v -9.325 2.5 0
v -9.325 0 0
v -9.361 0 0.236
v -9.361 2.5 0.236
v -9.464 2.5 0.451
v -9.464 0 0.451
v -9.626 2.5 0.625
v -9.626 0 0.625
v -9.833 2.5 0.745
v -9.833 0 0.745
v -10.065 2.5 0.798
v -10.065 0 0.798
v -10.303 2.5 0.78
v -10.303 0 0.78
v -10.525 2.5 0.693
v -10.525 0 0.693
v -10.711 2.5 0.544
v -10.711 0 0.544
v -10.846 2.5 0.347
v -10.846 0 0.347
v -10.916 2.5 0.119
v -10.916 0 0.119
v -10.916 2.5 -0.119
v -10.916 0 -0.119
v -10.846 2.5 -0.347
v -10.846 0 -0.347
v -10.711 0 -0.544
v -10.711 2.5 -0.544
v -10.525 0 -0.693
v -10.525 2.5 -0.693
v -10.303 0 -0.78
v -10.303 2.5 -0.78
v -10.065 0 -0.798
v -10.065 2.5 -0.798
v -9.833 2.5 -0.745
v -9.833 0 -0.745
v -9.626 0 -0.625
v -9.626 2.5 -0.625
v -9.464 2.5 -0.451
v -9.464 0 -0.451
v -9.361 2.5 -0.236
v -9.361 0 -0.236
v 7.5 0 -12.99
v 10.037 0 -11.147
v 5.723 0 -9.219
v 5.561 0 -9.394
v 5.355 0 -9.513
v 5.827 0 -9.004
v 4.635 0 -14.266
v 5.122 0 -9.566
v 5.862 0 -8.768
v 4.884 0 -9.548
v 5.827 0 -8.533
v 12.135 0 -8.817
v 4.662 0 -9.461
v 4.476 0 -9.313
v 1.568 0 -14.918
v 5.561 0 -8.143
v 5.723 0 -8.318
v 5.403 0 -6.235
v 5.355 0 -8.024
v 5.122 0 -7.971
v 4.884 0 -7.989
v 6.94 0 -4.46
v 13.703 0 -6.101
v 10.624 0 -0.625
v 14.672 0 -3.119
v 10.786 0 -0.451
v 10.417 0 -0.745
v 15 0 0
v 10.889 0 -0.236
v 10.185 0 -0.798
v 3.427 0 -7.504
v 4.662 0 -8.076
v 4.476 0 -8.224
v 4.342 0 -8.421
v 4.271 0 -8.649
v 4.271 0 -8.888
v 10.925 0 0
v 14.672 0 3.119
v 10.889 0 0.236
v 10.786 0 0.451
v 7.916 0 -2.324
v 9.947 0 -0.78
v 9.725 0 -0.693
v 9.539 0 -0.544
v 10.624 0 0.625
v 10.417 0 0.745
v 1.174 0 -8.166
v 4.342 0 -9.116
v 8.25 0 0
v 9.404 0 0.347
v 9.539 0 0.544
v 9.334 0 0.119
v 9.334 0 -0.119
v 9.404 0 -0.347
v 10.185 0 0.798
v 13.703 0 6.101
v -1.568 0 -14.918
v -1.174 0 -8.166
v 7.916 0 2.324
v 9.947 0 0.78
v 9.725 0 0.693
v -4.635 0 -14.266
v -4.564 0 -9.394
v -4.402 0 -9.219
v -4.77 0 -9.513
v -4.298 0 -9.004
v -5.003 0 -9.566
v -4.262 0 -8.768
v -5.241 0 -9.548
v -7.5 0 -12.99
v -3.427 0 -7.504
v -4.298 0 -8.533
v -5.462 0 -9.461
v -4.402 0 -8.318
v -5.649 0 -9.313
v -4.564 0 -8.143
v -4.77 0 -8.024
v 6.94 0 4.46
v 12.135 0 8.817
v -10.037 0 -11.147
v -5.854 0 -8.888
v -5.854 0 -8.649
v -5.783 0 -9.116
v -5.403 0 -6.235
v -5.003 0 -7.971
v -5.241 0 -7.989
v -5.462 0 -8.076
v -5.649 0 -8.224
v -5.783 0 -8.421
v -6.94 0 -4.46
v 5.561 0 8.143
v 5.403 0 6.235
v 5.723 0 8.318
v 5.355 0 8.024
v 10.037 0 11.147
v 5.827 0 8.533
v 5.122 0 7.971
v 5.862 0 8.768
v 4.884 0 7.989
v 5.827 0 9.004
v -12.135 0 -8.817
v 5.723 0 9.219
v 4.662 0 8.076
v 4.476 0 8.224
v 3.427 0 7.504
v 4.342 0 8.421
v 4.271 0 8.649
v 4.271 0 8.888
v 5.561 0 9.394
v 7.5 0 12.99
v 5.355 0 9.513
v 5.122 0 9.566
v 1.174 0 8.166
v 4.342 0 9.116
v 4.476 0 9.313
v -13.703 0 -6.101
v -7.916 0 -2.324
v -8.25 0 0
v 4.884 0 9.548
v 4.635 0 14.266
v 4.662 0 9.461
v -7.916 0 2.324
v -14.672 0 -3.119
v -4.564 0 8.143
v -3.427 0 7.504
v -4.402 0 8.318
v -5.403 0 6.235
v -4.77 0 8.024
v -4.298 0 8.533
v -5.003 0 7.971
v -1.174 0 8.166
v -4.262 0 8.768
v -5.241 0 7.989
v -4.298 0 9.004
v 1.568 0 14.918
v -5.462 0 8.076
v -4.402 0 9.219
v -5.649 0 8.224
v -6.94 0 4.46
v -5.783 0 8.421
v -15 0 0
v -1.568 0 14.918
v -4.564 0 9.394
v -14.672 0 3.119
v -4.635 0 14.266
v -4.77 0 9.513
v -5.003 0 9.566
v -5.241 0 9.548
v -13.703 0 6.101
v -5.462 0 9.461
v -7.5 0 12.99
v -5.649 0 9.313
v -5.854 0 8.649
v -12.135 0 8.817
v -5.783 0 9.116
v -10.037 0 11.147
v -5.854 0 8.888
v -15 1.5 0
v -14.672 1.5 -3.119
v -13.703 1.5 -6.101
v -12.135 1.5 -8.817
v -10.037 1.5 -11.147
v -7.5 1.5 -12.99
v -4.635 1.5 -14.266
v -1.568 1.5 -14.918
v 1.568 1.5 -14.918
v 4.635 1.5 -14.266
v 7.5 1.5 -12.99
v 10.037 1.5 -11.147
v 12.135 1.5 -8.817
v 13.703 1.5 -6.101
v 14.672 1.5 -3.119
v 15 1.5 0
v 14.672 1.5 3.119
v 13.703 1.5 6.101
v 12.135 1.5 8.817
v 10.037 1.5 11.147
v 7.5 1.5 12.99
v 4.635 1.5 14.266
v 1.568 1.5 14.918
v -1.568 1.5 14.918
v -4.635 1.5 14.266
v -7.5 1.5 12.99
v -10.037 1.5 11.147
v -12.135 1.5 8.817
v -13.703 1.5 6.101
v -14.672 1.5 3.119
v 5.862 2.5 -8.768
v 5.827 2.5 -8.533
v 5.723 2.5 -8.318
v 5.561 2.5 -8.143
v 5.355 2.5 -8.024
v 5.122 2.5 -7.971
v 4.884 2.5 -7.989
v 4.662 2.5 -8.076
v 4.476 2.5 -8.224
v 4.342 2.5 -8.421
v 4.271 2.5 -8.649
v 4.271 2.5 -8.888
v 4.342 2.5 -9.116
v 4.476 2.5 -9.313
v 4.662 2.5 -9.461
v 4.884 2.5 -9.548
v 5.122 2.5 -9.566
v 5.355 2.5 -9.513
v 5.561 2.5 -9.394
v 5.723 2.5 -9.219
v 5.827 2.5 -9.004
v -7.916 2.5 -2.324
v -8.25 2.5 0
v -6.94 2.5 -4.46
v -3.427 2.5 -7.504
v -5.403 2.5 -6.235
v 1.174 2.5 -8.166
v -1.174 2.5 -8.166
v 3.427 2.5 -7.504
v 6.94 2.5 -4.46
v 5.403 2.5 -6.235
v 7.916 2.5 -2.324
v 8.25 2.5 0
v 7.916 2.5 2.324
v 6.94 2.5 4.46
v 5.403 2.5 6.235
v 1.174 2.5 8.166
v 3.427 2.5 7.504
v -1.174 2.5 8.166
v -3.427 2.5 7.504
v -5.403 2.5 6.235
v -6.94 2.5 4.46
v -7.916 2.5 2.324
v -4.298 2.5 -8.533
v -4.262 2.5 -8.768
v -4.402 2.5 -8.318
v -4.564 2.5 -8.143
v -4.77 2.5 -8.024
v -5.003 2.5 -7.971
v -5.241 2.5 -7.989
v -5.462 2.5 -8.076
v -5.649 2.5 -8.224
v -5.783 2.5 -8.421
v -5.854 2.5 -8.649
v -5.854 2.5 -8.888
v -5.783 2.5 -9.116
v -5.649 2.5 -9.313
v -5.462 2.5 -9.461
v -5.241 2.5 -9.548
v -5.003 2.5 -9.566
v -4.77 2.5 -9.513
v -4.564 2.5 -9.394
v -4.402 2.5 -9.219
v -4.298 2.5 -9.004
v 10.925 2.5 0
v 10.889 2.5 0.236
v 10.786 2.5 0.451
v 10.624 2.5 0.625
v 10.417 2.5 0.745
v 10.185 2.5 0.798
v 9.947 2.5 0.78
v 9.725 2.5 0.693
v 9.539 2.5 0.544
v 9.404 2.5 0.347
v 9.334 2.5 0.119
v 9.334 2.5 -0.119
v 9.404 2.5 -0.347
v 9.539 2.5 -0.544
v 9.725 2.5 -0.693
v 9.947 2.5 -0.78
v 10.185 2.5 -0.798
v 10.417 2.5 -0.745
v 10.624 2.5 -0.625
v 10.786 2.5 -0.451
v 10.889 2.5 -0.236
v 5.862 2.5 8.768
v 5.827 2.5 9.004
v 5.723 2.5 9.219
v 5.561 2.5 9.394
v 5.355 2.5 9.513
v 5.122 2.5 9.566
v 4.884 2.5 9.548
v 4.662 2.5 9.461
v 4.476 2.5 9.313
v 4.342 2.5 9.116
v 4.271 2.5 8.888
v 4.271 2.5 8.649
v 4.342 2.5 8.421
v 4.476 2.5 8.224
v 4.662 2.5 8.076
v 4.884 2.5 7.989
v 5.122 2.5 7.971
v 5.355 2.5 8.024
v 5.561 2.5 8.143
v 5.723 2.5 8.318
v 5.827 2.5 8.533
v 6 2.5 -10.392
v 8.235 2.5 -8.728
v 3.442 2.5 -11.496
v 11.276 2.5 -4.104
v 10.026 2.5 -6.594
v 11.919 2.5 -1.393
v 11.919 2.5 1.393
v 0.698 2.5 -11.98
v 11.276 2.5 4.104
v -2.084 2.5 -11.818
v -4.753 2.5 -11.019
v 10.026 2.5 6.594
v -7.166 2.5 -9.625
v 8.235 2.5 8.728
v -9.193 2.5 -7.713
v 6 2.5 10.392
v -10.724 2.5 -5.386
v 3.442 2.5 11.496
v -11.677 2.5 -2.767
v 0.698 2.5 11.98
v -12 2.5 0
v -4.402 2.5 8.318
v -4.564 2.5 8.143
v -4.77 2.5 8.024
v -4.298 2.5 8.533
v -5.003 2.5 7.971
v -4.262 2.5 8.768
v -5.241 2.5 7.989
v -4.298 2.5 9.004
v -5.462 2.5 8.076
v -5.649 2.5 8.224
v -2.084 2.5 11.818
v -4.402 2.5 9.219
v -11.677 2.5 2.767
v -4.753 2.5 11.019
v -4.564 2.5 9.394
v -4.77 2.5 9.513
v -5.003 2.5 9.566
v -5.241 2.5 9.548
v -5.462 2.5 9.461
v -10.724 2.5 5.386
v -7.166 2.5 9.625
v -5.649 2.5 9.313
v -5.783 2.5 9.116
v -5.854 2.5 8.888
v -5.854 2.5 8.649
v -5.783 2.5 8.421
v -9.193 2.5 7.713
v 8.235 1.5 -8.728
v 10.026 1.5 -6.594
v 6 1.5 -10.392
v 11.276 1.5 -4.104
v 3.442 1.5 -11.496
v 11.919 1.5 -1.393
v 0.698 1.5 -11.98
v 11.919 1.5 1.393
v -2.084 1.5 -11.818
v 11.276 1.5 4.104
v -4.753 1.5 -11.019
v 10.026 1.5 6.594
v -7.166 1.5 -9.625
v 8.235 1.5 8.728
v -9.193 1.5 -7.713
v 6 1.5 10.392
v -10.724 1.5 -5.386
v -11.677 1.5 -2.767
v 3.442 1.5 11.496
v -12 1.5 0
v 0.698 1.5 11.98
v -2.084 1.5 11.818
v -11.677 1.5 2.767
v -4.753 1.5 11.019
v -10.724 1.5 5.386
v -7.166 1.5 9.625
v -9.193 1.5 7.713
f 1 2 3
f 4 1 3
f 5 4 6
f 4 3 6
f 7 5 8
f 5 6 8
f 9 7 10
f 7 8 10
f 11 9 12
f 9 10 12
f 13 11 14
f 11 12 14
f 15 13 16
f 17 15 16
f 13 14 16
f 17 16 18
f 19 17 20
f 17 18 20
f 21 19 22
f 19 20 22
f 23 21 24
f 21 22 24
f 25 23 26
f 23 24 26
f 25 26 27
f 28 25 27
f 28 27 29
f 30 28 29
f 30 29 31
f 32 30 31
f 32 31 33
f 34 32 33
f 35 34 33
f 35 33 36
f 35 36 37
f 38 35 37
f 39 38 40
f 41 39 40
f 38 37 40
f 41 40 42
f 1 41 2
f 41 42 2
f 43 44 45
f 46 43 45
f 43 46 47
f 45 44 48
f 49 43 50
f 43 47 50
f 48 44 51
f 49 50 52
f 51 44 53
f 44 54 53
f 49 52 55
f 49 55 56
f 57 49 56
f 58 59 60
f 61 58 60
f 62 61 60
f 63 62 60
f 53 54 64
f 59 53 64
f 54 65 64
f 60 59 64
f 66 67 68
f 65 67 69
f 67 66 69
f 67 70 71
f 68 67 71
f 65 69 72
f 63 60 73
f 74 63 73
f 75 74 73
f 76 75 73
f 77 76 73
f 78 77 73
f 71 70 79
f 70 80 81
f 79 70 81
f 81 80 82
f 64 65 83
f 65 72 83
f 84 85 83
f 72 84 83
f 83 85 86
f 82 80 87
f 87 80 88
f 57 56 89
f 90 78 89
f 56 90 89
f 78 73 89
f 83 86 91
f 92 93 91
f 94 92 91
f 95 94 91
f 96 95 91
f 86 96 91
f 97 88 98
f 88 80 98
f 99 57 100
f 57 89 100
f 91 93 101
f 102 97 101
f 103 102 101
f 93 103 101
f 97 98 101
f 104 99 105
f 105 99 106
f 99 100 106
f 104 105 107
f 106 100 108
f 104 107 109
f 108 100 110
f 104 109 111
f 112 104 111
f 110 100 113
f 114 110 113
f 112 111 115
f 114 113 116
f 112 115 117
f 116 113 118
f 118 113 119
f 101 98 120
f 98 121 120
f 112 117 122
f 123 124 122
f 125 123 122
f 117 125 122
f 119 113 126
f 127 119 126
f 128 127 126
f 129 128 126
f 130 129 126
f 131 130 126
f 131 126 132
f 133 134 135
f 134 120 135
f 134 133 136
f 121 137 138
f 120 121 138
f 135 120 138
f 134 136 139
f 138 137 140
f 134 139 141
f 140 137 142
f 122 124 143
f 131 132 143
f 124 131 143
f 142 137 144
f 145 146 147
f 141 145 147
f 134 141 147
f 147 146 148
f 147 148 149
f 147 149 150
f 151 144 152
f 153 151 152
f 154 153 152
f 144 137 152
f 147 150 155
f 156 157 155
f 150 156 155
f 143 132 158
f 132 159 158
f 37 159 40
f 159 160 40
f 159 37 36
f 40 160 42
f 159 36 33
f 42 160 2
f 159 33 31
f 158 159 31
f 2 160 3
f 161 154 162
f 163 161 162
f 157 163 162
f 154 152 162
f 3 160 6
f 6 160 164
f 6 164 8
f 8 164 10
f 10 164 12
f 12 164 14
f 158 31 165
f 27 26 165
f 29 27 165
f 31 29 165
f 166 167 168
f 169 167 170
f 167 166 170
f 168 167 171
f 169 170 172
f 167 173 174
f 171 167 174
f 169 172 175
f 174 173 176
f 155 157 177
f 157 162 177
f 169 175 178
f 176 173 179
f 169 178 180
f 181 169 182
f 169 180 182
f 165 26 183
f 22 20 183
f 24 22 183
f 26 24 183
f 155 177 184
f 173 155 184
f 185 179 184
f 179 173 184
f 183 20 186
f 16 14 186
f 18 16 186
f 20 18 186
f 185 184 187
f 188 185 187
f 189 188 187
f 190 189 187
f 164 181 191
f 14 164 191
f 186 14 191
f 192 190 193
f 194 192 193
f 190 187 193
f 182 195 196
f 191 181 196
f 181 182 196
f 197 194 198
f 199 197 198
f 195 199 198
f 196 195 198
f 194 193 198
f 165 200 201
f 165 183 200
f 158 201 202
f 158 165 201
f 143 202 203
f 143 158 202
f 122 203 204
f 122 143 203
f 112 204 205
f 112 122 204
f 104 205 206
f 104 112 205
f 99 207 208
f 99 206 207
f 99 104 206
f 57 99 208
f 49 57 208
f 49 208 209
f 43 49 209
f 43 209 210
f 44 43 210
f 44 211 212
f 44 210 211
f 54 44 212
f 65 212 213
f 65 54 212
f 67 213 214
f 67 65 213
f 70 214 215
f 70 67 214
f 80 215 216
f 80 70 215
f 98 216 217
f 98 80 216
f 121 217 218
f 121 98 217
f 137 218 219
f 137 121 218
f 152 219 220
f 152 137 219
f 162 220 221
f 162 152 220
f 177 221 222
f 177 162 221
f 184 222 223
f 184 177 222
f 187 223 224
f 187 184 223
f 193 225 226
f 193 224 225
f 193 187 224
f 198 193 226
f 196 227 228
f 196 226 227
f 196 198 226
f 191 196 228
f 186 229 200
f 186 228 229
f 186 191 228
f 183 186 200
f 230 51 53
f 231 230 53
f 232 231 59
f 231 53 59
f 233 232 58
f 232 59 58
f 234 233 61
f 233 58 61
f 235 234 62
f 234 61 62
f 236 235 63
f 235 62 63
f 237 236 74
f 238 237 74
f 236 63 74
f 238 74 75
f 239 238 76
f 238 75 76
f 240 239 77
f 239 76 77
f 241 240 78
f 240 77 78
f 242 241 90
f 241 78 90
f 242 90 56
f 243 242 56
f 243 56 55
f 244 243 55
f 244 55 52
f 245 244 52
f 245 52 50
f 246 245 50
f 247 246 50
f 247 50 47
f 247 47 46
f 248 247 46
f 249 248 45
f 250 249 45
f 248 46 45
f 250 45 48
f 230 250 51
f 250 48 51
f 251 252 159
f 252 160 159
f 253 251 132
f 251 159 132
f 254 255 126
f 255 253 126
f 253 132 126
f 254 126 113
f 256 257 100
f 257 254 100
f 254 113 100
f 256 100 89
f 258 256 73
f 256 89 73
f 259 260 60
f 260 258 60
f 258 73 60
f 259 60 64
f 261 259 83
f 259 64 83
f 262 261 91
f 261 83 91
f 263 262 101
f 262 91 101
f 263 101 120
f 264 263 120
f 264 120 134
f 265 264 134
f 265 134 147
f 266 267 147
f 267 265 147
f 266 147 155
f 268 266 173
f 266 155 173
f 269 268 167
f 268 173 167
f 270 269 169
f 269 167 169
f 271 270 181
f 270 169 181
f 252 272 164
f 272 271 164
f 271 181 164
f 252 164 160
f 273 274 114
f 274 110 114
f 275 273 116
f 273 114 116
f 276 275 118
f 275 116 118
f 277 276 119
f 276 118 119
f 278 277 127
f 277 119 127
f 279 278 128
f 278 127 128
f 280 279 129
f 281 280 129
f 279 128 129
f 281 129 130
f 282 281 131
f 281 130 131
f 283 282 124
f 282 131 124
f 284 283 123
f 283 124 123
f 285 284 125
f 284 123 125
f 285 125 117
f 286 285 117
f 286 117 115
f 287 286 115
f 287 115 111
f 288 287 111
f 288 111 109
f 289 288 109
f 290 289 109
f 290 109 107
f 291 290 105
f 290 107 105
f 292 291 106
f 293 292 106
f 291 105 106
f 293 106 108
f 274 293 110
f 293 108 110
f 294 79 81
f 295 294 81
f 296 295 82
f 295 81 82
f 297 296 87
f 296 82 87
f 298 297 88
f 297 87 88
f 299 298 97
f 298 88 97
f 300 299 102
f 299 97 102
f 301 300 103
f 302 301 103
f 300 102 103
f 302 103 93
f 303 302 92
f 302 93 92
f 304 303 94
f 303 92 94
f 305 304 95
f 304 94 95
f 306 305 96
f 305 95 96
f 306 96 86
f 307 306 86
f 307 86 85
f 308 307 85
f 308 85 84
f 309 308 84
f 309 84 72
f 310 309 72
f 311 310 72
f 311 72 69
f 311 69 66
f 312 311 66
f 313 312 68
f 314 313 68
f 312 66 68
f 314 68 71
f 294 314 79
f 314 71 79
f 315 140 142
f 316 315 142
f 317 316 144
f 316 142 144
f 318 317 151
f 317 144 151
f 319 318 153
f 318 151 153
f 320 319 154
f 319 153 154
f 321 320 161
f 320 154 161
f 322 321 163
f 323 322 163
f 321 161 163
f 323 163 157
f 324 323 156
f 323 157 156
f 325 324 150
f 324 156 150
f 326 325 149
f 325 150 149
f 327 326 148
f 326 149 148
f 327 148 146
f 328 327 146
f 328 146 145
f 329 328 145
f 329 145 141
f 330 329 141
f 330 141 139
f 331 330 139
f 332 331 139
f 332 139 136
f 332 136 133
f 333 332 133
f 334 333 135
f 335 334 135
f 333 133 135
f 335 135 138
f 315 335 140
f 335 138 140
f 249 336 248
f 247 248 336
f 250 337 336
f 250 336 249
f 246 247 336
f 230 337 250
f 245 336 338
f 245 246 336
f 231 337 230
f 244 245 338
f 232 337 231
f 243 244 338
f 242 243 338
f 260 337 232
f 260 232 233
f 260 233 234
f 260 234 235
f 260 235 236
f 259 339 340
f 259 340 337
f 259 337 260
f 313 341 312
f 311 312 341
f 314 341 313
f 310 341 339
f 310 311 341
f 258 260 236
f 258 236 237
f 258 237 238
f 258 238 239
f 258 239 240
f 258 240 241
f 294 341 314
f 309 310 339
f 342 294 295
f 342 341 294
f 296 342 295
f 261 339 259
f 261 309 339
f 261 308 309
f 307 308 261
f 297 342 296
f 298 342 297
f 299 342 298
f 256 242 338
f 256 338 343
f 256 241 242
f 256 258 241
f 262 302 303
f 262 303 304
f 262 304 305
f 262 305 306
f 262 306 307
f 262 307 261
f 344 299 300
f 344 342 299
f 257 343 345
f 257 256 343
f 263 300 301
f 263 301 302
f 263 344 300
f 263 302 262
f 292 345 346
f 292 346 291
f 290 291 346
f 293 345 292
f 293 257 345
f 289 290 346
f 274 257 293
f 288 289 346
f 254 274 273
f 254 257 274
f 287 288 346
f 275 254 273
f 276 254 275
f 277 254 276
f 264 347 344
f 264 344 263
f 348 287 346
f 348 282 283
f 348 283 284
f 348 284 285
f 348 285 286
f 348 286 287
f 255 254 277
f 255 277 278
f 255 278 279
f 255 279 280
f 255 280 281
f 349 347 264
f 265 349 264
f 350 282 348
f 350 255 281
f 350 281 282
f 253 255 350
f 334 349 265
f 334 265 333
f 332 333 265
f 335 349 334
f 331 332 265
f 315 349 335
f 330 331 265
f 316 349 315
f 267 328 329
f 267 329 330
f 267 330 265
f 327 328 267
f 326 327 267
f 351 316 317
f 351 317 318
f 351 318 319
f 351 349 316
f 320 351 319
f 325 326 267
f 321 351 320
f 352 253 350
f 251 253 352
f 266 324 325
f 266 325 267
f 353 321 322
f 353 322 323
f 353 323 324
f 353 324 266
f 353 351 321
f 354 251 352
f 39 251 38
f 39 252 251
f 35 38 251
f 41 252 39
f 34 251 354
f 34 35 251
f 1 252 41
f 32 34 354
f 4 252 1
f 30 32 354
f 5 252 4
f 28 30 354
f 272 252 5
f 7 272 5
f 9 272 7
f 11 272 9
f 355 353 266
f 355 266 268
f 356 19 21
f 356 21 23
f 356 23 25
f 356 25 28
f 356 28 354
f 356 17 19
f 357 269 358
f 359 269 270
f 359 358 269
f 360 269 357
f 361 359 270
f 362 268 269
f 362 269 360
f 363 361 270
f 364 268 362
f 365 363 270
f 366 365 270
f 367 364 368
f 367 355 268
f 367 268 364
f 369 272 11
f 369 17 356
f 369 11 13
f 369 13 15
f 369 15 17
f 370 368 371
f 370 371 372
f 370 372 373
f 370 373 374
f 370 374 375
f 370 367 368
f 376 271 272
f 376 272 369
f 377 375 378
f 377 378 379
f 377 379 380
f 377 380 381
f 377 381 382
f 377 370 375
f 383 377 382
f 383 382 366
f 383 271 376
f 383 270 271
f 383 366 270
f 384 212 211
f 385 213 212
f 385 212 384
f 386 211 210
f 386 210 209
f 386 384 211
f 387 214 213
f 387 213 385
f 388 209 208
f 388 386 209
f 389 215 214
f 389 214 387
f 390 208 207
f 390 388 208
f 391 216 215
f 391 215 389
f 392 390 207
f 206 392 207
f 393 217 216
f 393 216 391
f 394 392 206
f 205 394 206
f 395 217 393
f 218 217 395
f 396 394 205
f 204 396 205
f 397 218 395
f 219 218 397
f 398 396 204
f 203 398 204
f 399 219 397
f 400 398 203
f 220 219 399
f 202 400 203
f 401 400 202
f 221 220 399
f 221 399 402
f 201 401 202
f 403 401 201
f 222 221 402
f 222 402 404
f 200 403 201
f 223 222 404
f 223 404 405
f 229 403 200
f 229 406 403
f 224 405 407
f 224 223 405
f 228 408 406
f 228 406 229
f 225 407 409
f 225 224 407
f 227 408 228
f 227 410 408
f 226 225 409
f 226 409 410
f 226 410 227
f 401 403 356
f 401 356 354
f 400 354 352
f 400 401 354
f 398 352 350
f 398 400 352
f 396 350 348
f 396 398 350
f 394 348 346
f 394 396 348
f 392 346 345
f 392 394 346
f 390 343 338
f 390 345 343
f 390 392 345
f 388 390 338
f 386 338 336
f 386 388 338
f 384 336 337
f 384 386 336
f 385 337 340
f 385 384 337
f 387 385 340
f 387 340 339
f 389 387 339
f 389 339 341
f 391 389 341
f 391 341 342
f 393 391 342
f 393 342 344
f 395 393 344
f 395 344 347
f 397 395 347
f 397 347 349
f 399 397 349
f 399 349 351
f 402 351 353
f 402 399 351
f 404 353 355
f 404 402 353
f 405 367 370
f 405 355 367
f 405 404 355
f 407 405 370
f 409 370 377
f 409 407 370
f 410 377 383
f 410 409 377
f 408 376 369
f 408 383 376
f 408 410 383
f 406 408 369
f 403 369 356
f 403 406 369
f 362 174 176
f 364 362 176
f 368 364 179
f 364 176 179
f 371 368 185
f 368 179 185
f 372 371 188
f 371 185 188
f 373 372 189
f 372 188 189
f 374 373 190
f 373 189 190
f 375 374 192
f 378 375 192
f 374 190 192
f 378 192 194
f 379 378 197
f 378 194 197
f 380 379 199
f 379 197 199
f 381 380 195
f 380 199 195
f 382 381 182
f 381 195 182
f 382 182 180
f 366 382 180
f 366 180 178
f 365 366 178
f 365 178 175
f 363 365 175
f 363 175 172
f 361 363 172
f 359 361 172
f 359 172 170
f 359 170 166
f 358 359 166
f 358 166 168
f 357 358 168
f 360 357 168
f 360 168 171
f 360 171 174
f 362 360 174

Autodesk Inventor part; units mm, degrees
ref_plane "YZ Plane" through (0, 0, 0) normal (1, 0, 0) x (0, 1, 0)
ref_plane "XZ Plane" through (0, 0, 0) normal (0, 1, 0) x (-1, 0, 0)
ref_plane "XY Plane" through (0, 0, 0) normal (0, 0, 1) x (1, 0, 0)
sketch "スケッチ1" plane through (0, 0, 0) normal (0, 1, 0) x (-1, 0, 0)
  circle A0 centre (0, 0) radius 8.25
  circle A1 centre (0, 0) radius 15
  circle A2 centre (0, 0) radius 12
  dimension "d0" = 16.5
  dimension "d1" = 30
  dimension "d5" = 24
extrude "押し出し1" add sketch "スケッチ1" along normal blind 1.5 contours A1 | A2
extrude "押し出し2" add sketch "スケッチ1" along normal blind 2.5 contours A2
sketch "スケッチ2" plane through (0, 0, 0) normal (0, -1, 0) x (1, 0, 0)
  circle A0 centre (5.0625, -8.7685) radius 1 construction
  circle A1 centre (10.125, 0) radius 1 construction
  circle A2 centre (5.0625, 8.7685) radius 1 construction
  circle A3 centre (-5.0625, 8.7685) radius 1 construction
  circle A4 centre (-10.125, 0) radius 1 construction
  circle A5 centre (-5.0625, -8.7685) radius 1 construction
  circle A6 centre (10.125, 0) radius 0.8
  circle A7 centre (5.0625, -8.7685) radius 0.8
  circle A8 centre (-5.0625, -8.7685) radius 0.8
  circle A9 centre (-10.125, 0) radius 0.8
  circle A10 centre (-5.0625, 8.7685) radius 0.8
  circle A11 centre (5.0625, 8.7685) radius 0.8
  point P0 (0, 0)
  dimension "d10" = 1.6
  dimension "d11" = 1.6
  dimension "d12" = 1.6
  dimension "d13" = 1.6
  dimension "d14" = 1.6
  dimension "d15" = 1.6
extrude "押し出し3" cut sketch "スケッチ2" against normal through all
equation "\"BendRadius\" = Thickness"
equation "\"BendReliefWidth\" = Thickness"
equation "\"BendReliefDepth\" = 0.5 * Thickness"
equation "\"CornerReliefSize\" = 4 * Thickness"
equation "\"MinimumRemnant\" = 2 * Thickness"
equation "\"TransitionRadius\" = BendRadius"
equation "\"JacobiRadiusSize\" = BendRadius"
equation "\"GapSize\" = Thickness"
equation "\"Thickness\" = 1.5"
properties part number "sholder_joint_c"
